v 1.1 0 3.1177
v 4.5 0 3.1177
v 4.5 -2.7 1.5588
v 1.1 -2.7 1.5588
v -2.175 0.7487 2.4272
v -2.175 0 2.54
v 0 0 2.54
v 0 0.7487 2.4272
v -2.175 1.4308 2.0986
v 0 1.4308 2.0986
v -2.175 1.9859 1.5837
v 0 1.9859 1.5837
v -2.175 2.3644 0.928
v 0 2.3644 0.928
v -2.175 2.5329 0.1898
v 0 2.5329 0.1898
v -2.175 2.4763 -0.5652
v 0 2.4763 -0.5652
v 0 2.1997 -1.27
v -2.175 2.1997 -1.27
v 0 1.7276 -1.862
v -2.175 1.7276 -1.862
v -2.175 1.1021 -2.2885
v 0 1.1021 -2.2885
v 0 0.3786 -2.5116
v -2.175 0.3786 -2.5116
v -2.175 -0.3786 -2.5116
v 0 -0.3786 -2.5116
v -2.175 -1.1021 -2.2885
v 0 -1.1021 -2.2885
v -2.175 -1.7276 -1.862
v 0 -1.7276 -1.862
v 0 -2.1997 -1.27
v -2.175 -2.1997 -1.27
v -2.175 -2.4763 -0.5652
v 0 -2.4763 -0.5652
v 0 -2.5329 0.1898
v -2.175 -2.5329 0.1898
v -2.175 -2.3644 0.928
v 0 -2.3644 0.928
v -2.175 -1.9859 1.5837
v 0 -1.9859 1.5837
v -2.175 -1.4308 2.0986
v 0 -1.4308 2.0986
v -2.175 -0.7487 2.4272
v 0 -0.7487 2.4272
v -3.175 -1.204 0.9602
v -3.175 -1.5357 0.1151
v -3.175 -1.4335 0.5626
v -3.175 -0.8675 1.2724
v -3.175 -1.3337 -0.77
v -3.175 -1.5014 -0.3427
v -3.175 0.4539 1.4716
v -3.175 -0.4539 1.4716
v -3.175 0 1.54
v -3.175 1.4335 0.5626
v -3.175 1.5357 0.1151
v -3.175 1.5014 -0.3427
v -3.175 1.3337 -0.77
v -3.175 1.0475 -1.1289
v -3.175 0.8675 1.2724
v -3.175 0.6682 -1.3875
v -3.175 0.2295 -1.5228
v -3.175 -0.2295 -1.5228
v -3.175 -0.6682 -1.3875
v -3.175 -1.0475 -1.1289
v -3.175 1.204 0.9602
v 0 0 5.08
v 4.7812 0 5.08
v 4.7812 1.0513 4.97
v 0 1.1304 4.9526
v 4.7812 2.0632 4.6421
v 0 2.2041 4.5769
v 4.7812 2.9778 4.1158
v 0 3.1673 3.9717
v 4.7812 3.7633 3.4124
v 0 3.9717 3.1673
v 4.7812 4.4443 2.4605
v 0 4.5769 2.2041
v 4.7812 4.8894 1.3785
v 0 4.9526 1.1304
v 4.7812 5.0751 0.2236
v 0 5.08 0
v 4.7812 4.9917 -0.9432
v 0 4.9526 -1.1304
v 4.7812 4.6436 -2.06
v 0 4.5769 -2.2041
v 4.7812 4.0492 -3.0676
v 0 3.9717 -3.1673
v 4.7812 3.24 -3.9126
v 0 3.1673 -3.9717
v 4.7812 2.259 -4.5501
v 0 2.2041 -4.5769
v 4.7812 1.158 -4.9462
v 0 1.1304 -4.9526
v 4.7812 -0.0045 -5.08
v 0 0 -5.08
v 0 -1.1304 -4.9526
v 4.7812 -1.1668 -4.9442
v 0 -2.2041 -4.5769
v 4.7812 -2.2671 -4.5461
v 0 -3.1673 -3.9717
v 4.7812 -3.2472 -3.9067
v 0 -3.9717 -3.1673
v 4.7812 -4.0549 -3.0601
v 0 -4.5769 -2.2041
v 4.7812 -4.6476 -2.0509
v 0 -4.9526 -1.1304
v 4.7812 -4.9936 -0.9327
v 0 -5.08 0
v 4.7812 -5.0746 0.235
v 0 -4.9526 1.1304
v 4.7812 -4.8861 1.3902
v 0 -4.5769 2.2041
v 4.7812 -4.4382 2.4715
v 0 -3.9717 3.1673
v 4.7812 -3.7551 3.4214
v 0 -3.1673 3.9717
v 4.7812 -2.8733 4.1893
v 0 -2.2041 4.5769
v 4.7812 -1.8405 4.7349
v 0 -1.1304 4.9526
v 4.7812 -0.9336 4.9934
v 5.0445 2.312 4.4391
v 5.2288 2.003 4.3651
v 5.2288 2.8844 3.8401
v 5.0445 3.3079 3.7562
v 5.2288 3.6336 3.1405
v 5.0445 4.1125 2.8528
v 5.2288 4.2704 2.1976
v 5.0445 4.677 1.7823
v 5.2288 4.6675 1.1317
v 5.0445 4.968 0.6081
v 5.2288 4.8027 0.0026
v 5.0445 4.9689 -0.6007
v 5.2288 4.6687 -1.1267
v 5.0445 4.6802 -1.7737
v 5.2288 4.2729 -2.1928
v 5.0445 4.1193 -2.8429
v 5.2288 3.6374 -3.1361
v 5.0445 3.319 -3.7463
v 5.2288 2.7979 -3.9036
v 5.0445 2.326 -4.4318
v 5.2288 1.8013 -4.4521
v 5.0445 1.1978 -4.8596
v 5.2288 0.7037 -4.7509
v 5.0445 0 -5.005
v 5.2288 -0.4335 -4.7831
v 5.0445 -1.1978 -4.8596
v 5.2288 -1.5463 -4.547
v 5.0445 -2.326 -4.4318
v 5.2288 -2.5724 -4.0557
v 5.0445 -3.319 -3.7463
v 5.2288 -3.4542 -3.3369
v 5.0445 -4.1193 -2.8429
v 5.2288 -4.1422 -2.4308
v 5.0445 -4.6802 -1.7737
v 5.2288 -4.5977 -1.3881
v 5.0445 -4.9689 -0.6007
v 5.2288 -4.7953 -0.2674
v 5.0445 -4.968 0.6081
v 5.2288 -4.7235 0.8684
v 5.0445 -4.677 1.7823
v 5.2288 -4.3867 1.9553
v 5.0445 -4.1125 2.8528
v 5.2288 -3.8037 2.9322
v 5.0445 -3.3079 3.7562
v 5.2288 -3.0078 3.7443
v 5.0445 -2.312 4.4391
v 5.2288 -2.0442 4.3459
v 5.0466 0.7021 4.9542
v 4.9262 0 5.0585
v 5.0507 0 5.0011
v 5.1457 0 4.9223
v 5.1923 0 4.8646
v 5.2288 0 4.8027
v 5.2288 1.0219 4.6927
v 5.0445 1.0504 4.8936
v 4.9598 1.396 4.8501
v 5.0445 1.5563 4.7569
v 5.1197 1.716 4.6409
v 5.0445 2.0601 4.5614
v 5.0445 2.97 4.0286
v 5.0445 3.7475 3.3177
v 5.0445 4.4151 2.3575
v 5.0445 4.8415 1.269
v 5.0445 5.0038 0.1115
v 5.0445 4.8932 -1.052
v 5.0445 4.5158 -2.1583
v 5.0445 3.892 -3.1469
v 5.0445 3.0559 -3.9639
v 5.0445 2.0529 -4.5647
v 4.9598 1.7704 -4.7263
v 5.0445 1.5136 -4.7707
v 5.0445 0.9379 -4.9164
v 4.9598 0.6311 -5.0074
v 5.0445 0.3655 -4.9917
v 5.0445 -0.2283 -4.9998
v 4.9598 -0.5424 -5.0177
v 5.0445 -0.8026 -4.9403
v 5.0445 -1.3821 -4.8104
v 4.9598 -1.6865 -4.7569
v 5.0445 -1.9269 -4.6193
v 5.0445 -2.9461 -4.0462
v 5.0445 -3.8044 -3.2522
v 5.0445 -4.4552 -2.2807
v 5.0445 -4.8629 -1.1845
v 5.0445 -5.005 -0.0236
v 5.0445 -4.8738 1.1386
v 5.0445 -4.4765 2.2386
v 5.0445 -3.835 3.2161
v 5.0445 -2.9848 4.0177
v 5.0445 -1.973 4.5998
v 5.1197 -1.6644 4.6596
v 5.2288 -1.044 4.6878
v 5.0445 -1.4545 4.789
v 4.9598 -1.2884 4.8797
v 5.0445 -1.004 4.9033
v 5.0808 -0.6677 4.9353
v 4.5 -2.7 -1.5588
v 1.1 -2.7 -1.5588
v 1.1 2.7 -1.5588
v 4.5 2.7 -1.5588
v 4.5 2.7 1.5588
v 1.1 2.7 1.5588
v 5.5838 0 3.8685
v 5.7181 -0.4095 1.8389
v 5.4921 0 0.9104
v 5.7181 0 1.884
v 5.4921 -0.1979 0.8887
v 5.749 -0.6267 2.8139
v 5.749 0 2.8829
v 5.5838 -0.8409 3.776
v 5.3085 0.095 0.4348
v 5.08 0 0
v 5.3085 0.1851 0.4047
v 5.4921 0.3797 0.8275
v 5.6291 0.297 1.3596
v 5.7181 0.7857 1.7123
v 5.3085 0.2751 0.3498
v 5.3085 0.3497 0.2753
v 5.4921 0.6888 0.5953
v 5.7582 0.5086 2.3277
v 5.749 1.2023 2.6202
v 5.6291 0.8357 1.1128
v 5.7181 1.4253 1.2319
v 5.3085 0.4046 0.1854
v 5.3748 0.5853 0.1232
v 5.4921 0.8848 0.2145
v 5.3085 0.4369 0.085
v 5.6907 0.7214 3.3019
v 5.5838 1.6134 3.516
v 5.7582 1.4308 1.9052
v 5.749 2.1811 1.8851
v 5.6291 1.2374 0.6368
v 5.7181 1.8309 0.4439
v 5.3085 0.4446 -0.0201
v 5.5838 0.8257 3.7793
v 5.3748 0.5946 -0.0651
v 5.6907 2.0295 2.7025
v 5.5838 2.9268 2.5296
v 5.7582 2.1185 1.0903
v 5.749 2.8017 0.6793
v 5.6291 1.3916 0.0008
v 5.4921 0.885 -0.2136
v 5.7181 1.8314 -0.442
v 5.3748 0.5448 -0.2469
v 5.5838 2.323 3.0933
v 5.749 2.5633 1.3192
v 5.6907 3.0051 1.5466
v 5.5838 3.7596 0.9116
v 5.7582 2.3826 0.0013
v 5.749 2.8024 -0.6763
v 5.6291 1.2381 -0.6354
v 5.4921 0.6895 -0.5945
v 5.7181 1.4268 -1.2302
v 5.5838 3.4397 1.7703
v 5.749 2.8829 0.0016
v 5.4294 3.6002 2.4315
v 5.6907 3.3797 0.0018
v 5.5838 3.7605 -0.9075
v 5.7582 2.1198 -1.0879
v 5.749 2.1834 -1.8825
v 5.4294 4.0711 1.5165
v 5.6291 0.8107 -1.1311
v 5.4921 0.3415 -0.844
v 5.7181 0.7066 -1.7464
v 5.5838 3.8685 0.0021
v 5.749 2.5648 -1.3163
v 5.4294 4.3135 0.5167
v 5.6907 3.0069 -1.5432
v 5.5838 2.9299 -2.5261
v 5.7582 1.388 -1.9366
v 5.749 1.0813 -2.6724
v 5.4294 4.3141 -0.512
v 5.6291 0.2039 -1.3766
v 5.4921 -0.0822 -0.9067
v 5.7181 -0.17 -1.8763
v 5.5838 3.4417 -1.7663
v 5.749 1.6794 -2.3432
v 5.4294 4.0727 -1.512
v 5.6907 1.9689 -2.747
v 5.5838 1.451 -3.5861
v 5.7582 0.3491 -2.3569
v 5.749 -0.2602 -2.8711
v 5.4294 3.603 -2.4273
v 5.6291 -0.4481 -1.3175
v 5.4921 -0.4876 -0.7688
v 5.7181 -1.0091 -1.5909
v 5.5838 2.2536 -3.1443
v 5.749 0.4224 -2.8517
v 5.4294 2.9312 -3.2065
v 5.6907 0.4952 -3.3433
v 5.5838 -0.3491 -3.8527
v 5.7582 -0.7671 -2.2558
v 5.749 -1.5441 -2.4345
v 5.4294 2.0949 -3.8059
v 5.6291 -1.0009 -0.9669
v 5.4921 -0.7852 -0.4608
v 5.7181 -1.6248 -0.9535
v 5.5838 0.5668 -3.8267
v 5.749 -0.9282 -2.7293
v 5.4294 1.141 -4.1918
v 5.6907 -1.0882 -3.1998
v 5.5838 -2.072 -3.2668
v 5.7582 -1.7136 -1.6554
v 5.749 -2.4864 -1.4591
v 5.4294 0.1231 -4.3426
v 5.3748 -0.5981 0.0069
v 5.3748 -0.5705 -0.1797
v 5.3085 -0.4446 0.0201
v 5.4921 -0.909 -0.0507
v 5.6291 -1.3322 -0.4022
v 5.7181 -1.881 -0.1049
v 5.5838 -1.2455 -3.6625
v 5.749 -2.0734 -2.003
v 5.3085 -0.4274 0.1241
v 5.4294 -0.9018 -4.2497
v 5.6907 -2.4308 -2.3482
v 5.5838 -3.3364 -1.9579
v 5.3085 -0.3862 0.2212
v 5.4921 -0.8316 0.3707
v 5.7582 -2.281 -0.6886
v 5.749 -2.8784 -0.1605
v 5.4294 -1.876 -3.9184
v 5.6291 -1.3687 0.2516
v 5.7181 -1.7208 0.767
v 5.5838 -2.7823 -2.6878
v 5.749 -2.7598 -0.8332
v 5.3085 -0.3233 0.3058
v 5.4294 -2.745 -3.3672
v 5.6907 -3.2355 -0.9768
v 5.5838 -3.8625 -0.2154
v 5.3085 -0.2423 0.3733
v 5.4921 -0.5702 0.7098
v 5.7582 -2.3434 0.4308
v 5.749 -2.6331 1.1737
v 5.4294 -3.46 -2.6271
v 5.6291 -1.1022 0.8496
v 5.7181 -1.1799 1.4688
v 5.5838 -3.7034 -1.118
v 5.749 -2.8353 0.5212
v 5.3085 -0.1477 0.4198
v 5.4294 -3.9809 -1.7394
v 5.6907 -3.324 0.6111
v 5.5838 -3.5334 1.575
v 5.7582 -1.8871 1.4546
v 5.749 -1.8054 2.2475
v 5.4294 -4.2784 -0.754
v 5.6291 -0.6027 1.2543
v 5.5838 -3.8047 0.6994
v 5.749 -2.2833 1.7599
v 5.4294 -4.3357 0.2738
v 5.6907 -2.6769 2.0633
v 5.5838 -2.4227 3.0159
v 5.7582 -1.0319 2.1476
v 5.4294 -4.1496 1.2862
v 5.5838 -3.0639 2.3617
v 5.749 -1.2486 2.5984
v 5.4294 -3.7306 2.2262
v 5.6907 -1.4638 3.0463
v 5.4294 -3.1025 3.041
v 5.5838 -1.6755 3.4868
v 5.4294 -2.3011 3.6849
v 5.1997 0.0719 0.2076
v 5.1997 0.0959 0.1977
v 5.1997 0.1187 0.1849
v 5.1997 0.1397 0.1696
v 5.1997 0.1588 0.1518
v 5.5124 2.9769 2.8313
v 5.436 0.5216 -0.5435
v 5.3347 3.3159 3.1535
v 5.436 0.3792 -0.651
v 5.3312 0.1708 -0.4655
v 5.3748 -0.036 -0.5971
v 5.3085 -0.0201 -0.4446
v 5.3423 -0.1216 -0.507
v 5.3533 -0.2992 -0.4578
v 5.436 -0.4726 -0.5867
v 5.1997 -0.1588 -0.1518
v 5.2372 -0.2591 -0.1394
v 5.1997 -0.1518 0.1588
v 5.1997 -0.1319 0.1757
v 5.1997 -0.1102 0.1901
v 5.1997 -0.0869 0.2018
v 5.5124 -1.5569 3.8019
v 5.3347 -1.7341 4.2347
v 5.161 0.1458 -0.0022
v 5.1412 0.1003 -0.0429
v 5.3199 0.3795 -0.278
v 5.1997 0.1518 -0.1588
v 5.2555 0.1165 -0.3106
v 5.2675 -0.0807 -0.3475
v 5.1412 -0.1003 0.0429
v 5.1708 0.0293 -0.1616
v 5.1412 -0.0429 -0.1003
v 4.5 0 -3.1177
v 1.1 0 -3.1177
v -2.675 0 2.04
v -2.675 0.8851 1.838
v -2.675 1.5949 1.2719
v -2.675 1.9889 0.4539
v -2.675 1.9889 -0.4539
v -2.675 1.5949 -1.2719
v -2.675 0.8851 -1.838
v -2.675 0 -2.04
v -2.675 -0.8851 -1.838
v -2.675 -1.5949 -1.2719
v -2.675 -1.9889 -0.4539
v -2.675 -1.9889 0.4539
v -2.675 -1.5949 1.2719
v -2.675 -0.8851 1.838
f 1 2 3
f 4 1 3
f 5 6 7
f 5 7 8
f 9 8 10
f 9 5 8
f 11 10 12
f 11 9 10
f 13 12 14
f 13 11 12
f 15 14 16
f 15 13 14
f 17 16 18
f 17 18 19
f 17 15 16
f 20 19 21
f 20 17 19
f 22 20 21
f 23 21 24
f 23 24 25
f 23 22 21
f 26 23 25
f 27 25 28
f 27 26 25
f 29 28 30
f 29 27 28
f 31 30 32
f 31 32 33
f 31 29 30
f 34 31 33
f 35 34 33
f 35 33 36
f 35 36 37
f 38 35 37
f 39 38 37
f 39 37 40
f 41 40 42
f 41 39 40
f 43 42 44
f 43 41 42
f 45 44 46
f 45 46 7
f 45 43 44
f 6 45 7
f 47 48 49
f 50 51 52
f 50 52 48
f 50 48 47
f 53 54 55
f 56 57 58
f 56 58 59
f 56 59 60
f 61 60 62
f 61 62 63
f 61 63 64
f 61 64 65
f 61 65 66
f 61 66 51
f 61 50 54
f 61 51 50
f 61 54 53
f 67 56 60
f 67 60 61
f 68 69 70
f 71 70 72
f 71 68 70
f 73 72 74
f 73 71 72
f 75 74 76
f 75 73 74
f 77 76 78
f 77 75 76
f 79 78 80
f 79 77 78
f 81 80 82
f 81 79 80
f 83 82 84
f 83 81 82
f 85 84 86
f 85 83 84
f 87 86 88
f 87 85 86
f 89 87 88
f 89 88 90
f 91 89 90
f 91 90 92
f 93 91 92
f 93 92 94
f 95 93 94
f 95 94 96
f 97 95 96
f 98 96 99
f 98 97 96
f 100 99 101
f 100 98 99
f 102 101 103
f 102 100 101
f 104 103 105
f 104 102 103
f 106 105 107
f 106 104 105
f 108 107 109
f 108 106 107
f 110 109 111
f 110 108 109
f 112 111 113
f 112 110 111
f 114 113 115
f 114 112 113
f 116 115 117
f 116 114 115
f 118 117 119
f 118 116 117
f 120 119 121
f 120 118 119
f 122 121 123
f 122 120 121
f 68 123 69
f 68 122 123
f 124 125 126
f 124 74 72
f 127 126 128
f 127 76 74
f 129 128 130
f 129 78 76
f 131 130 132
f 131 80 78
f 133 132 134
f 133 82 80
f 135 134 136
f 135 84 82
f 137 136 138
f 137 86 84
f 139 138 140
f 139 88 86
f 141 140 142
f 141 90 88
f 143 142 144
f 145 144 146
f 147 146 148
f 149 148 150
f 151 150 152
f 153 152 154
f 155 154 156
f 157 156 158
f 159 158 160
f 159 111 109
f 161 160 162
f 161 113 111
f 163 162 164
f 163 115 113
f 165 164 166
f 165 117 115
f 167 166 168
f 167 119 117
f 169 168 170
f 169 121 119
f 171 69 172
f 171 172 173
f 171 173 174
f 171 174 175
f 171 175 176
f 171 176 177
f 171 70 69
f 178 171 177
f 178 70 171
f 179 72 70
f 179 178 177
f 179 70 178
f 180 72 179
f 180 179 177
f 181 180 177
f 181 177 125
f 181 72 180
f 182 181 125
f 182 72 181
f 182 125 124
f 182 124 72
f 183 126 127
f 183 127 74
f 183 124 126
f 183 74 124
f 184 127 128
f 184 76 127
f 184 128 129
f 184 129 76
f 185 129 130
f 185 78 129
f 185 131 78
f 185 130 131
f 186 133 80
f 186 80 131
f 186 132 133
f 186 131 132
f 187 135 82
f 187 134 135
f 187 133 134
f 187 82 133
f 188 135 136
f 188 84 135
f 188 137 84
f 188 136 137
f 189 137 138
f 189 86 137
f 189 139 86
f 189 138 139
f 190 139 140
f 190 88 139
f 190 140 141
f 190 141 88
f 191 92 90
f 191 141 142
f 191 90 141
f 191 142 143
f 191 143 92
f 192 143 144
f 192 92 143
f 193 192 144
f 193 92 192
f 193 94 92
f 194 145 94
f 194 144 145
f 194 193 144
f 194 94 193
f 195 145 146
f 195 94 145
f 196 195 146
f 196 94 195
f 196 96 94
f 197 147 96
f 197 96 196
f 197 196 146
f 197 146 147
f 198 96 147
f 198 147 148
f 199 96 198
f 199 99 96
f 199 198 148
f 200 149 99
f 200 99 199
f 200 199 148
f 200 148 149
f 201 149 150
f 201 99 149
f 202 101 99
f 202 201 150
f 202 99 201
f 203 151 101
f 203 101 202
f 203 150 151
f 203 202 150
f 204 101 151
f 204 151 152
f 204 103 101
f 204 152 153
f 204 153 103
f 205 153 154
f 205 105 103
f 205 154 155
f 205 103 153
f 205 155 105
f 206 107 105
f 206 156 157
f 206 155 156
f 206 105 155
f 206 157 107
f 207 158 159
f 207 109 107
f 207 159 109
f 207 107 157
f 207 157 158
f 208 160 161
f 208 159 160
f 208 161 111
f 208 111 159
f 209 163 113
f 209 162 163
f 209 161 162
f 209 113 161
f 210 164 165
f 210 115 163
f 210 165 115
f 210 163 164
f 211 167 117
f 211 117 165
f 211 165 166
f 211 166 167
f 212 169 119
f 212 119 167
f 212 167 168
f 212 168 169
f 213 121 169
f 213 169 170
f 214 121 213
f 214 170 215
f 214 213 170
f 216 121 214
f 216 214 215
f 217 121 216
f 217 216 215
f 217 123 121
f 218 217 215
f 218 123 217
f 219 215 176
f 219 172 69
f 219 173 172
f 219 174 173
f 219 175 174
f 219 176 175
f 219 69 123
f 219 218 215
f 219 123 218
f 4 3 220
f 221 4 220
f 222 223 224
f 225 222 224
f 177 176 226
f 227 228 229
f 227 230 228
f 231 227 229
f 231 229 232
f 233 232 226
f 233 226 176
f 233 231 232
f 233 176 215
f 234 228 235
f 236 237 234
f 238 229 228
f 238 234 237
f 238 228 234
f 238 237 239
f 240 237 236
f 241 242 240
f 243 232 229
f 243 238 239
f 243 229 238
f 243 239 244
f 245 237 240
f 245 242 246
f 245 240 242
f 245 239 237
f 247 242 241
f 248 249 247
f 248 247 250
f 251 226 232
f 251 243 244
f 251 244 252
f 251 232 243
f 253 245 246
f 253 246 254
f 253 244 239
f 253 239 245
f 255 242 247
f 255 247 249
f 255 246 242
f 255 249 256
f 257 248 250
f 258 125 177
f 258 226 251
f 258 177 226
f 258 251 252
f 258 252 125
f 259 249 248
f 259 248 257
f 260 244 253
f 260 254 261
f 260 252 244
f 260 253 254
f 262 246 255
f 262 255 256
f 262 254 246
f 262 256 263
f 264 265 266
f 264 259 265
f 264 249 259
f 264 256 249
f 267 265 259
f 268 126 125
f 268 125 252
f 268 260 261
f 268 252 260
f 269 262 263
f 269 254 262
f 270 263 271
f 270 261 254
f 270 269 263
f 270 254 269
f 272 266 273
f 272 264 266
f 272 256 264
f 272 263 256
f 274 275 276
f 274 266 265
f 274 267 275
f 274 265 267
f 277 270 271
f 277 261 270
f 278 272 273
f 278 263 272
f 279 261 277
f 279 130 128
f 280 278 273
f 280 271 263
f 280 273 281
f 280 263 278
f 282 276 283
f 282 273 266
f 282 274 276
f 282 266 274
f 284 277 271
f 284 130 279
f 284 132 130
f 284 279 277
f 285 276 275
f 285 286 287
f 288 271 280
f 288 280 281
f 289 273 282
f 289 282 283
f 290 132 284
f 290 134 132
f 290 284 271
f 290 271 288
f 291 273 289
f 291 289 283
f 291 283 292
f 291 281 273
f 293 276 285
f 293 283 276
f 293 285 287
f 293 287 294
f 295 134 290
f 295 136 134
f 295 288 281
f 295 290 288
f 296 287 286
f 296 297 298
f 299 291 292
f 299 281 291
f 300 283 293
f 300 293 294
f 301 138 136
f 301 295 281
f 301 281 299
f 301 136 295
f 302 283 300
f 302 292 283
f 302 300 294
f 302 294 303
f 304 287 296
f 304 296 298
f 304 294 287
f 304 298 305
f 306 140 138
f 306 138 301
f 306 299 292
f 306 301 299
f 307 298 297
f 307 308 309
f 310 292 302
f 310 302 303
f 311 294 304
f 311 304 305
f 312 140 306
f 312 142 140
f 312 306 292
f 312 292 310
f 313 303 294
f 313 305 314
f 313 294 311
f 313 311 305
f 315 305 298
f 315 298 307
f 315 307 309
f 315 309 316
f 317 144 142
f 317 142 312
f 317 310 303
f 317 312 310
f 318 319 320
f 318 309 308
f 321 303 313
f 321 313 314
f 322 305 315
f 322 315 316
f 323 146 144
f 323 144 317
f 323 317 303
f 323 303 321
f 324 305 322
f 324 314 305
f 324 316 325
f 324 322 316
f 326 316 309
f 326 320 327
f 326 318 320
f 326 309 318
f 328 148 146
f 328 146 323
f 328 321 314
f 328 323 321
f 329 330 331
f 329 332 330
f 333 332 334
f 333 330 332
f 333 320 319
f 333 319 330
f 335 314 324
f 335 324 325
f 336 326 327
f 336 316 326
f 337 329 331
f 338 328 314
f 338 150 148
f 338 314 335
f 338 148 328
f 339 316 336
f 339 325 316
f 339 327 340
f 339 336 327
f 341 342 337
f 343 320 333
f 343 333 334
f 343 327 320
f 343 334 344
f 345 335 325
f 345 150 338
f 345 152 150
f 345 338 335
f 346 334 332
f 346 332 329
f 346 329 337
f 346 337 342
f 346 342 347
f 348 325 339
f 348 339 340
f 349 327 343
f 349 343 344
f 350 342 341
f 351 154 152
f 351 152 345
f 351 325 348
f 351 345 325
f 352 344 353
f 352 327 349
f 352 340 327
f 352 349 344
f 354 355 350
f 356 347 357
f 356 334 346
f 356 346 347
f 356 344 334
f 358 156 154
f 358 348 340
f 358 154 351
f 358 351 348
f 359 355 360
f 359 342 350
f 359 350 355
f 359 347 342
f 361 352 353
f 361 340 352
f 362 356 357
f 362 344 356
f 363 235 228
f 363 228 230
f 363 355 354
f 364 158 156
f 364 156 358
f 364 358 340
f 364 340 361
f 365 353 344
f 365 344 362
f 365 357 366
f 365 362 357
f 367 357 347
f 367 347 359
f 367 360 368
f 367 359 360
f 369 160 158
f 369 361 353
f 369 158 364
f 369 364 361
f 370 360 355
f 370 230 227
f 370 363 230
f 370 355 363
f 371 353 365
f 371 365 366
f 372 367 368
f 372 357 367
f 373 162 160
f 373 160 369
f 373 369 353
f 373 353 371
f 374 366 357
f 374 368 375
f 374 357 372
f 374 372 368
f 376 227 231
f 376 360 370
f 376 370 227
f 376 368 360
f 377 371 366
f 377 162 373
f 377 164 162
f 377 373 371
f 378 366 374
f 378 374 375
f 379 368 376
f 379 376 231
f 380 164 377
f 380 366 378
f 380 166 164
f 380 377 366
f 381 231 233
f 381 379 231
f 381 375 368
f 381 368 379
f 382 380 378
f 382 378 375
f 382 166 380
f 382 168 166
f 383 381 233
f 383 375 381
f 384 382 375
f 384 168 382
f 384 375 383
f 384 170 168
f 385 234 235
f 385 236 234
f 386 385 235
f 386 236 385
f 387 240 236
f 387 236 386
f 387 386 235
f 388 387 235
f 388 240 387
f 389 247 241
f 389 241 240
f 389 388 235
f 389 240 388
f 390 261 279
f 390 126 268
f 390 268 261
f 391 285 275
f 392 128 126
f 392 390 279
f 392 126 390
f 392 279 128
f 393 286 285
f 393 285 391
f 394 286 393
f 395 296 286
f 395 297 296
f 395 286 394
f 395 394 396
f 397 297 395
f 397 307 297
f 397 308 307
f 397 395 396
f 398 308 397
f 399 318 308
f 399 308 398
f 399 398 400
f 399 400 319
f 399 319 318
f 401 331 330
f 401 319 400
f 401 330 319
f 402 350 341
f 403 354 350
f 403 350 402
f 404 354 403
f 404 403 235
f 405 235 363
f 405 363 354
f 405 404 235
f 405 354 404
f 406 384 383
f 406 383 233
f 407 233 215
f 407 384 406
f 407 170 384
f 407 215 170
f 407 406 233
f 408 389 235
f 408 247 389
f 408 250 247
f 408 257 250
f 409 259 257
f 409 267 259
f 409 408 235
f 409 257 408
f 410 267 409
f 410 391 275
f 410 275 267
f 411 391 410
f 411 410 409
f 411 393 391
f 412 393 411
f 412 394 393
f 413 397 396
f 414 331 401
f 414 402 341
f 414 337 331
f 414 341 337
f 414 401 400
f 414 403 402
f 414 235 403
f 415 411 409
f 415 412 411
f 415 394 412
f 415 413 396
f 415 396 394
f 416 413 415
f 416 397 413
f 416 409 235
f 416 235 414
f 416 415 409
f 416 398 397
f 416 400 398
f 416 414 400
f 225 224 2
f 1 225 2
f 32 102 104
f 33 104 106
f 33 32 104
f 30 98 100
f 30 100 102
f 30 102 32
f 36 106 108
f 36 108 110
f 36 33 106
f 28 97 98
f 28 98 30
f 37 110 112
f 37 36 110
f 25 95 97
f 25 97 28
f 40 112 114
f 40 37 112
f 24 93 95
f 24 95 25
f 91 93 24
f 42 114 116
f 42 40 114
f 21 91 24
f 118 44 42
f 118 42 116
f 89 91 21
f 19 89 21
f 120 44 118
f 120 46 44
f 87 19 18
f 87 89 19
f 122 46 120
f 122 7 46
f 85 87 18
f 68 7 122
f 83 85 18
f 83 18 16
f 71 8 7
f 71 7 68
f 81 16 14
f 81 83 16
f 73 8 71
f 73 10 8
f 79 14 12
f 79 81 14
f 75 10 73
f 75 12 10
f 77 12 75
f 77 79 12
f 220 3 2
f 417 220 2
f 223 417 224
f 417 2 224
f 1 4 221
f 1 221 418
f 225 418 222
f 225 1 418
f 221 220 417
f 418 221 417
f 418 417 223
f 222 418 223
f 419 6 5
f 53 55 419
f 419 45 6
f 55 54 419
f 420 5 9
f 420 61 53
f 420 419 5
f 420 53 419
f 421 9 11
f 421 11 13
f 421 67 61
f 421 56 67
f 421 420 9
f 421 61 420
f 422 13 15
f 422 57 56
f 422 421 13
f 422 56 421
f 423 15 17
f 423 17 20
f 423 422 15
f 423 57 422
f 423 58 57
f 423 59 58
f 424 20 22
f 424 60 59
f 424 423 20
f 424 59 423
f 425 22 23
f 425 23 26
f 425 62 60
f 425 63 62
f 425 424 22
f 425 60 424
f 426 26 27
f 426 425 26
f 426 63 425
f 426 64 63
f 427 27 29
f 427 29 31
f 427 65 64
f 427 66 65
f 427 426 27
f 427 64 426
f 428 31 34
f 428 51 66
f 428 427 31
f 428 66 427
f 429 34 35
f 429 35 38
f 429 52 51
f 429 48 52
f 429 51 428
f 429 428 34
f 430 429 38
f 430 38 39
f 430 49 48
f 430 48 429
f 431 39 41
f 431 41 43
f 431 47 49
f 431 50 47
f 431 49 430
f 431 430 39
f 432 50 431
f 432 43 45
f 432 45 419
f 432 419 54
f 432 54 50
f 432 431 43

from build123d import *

# Parameters (mm, degrees)
F2_SIZE  = 1
F3_R     = 0.5
F6_DEPTH = 3.4


with BuildPart() as f1:
    # F0 (on Front) → F1 (revolve)
    with BuildSketch(Plane.XZ):
        with BuildLine():
            Line((0, 5.08), (0, 2.54))
            Line((0, 2.54), (-3.175, 2.54))
            Line((-3.175, 2.54), (-3.175, 0))
            Line((-3.175, 0), (5.08, 0))
            ThreePointArc((5.08, 0), (5.760591, 2.54), (5.08, 5.08))
            Line((5.08, 5.08), (0, 5.08))
        make_face()
    revolve(axis=Axis((-24.371815, 0, 0), (-1, 0, 0)))

    # F2
    f2_edges = [f1.edges().sort_by_distance(p)[0] for p in [
        (-3.175, 0, -2.54),
    ]]
    chamfer(f2_edges, length=F2_SIZE)

    # F3
    f3_edges = [f1.edges().sort_by_distance(p)[0] for p in [
        (5.08, 0, -5.08),
    ]]
    fillet(f3_edges, radius=F3_R)

    # F5 (on offset) → F6 (cut)
    with BuildSketch(Plane.YZ.offset(4.5)):
        Polygon((0, -3.117691), (2.7, -1.558846), (2.7, 1.558846), (0, 3.117691), (-2.7, 1.558846), (-2.7, -1.558846), align=None)
    extrude(amount=-F6_DEPTH, mode=Mode.SUBTRACT)


solid = f1.part
